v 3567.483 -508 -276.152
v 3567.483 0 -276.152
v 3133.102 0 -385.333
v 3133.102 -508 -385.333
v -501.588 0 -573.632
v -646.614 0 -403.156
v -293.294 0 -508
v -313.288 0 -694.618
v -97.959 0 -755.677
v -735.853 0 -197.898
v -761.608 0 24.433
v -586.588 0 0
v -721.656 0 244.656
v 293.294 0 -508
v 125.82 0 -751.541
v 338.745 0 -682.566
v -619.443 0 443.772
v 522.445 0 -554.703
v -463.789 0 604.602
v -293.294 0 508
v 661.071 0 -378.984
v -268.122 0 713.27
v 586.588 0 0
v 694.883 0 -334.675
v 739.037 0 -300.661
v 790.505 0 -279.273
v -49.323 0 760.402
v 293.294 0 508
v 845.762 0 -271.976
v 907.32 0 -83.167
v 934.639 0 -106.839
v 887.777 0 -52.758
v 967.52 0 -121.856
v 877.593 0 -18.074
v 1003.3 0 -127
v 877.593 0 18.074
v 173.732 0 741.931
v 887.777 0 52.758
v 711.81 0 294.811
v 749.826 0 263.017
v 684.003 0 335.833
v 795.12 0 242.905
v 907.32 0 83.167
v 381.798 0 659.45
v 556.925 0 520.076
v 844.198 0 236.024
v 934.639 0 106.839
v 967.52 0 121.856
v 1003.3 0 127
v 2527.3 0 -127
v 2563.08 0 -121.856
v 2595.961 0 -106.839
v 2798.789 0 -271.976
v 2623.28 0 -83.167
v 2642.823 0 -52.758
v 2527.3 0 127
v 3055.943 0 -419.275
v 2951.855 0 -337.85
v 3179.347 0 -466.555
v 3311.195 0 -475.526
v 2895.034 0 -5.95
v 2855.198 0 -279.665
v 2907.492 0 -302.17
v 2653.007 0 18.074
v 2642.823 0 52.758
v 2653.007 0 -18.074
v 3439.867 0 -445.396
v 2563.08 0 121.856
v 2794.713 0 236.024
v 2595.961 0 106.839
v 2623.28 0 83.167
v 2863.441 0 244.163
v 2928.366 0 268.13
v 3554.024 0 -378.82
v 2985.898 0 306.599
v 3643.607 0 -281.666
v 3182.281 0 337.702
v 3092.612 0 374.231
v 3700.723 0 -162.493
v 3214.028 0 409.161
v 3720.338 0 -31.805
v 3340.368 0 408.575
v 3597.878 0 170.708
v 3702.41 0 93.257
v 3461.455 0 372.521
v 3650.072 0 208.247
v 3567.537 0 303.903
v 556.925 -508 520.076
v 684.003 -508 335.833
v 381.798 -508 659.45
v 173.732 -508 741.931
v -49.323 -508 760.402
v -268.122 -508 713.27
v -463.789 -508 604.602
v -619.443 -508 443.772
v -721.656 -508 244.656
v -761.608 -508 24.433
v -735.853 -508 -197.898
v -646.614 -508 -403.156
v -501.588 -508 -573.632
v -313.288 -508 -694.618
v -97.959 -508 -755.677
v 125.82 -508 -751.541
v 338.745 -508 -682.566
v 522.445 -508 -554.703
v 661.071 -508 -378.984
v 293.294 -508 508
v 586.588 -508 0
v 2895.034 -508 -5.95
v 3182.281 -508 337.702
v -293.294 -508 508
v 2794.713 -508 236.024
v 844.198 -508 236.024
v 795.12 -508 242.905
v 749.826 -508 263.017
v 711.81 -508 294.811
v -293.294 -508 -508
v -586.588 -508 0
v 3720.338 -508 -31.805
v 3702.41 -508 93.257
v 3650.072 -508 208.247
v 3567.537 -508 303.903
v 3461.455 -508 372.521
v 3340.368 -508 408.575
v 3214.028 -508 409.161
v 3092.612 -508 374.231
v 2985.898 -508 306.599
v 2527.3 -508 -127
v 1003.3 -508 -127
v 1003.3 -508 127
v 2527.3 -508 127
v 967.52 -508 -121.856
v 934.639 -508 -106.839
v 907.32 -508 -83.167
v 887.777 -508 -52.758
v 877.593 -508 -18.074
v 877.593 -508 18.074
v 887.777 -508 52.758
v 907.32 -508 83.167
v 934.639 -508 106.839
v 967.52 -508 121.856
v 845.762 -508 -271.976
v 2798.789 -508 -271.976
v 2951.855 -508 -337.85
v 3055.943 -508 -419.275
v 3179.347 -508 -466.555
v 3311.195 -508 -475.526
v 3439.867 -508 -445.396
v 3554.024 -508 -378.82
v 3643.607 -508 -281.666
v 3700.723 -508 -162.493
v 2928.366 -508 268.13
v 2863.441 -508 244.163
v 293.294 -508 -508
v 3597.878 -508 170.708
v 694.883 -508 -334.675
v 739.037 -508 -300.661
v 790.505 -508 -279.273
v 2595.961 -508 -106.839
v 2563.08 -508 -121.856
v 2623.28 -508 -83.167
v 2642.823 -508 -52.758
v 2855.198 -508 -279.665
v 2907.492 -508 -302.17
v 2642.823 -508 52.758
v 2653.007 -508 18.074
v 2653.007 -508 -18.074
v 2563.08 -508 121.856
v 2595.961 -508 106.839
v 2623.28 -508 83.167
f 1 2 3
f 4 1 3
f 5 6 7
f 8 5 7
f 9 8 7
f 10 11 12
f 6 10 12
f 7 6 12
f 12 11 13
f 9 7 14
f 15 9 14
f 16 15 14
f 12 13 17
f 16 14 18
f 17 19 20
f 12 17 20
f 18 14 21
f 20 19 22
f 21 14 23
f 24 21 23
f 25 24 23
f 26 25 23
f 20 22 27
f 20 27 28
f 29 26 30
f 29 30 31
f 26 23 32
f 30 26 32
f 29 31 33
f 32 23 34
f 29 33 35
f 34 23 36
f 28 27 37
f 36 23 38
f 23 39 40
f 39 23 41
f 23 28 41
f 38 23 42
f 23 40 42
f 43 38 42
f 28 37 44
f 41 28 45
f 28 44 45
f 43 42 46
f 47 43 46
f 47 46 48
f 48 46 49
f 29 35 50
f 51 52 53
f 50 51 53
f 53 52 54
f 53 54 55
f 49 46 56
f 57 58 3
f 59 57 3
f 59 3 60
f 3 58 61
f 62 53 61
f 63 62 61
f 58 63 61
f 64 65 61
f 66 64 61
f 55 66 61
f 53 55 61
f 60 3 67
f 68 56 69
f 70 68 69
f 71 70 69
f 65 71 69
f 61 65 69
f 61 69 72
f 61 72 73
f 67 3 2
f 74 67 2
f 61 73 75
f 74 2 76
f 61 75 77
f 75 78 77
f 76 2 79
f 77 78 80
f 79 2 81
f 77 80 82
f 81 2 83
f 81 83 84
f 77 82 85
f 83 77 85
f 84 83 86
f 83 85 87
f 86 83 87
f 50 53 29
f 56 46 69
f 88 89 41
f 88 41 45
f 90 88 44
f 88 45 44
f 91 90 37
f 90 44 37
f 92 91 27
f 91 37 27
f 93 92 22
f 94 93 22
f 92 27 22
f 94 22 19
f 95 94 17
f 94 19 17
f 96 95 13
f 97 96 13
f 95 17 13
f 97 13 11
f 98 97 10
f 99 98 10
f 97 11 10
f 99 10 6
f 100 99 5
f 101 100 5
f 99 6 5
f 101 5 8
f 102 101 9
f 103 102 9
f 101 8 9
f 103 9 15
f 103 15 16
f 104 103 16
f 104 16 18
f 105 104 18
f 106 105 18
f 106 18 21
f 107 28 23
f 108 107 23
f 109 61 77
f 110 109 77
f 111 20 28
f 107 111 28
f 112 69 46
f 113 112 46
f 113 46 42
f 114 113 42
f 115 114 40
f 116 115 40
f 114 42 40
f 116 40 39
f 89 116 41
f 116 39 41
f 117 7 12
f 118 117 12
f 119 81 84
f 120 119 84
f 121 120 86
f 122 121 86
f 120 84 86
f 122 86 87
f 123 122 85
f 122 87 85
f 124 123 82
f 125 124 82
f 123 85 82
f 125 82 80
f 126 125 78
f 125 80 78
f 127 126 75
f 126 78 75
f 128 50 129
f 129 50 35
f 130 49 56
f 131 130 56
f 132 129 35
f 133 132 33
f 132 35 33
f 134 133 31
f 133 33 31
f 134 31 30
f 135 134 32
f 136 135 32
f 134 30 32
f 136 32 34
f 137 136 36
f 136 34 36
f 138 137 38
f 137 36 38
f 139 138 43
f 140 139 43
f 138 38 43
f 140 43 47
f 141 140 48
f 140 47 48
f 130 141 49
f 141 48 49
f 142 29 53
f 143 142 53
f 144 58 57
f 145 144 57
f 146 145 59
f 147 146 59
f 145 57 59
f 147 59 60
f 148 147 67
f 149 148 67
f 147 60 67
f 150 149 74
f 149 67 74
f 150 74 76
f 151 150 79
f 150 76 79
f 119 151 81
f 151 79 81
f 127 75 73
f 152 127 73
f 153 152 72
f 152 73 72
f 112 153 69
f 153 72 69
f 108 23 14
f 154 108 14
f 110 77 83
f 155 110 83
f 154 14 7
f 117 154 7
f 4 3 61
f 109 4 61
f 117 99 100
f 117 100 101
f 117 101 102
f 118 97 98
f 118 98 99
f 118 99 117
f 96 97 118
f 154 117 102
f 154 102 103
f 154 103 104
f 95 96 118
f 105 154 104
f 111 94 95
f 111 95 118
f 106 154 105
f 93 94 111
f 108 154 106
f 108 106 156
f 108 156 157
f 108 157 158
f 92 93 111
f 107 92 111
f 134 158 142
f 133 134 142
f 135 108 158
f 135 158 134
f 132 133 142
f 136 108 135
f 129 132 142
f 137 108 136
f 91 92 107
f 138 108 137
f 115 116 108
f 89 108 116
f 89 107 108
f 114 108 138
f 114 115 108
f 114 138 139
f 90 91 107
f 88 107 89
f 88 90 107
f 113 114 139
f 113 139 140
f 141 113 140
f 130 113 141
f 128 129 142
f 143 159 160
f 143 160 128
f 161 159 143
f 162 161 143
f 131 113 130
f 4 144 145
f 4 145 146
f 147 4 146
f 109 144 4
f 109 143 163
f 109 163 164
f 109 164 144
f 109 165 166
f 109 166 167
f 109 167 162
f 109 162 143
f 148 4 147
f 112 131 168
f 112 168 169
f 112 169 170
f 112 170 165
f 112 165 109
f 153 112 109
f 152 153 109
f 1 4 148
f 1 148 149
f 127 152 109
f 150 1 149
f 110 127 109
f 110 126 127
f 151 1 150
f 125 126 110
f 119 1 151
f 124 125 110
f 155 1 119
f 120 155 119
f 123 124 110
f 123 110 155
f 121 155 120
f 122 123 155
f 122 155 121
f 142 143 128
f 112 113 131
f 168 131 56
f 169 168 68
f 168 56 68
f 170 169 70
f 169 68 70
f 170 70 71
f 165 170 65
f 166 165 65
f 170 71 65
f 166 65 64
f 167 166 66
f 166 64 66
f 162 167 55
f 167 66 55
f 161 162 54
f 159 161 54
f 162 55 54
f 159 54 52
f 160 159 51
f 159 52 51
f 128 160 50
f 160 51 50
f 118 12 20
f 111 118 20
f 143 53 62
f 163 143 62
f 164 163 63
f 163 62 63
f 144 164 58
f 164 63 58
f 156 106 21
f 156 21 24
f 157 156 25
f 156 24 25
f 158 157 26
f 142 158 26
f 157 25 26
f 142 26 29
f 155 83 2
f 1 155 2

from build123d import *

# Parameters (mm, degrees)
F1_DEPTH = 508


with BuildPart() as f1:
    # F0 (on Front) → F1 (new body)
    with BuildSketch(Plane.XZ):
        with BuildLine():
            ThreePointArc((661.071386, -378.98367), (736.335656, -196.096409), (762, 0))
            ThreePointArc((762, 0), (742.244723, 172.385532), (684.003224, 335.832681))
            ThreePointArc((684.003224, 335.832681), (-761.608187, 24.432954), (661.071386, -378.98367))
        make_face()
        Polygon((-586.587873, 0), (-293.293937, 508), (293.293937, 508), (586.587873, 0), (293.293937, -508), (-293.293937, -508), align=None, mode=Mode.SUBTRACT)
        with BuildLine():
            ThreePointArc((684.003224, 335.832681), (742.244723, 172.385532), (762, 0))
            ThreePointArc((762, 0), (736.335656, -196.096409), (661.071386, -378.98367))
            ThreePointArc((661.071386, -378.98367), (739.036508, -300.660714), (845.761669, -271.976476))
            Line((845.761669, -271.976476), (2798.789212, -271.976476))
            ThreePointArc((2798.789212, -271.976476), (2882.108521, -289.1441), (2951.854781, -337.850298))
            ThreePointArc((2951.854781, -337.850298), (2830.593289, -8.320924), (2985.89789, 306.59881))
            ThreePointArc((2985.89789, 306.59881), (2896.610481, 254.230653), (2794.712661, 236.023524))
            Line((2794.712661, 236.023524), (844.198016, 236.023524))
            ThreePointArc((844.198016, 236.023524), (749.826093, 263.017331), (684.003224, 335.832681))
        make_face()
        with BuildLine():
            Line((2527.3, -127), (1003.3, -127))
            ThreePointArc((1003.3, -127), (876.3, 0), (1003.3, 127))
            Line((1003.3, 127), (2527.3, 127))
            ThreePointArc((2527.3, 127), (2654.3, 0), (2527.3, -127))
        make_face(mode=Mode.SUBTRACT)
        with BuildLine():
            ThreePointArc((3720.337772, -31.804987), (3461.454806, 372.521326), (2985.89789, 306.59881))
            ThreePointArc((2985.89789, 306.59881), (2830.593289, -8.320924), (2951.854781, -337.850298))
            ThreePointArc((2951.854781, -337.850298), (3439.866562, -445.395921), (3720.337772, -31.804987))
        make_face()
        Polygon((3133.102127, -385.33265), (2895.033882, -5.950153), (3182.280944, 337.701842), (3597.877637, 170.707958), (3567.483456, -276.151933), align=None, mode=Mode.SUBTRACT)
    extrude(amount=F1_DEPTH)


solid = f1.part
